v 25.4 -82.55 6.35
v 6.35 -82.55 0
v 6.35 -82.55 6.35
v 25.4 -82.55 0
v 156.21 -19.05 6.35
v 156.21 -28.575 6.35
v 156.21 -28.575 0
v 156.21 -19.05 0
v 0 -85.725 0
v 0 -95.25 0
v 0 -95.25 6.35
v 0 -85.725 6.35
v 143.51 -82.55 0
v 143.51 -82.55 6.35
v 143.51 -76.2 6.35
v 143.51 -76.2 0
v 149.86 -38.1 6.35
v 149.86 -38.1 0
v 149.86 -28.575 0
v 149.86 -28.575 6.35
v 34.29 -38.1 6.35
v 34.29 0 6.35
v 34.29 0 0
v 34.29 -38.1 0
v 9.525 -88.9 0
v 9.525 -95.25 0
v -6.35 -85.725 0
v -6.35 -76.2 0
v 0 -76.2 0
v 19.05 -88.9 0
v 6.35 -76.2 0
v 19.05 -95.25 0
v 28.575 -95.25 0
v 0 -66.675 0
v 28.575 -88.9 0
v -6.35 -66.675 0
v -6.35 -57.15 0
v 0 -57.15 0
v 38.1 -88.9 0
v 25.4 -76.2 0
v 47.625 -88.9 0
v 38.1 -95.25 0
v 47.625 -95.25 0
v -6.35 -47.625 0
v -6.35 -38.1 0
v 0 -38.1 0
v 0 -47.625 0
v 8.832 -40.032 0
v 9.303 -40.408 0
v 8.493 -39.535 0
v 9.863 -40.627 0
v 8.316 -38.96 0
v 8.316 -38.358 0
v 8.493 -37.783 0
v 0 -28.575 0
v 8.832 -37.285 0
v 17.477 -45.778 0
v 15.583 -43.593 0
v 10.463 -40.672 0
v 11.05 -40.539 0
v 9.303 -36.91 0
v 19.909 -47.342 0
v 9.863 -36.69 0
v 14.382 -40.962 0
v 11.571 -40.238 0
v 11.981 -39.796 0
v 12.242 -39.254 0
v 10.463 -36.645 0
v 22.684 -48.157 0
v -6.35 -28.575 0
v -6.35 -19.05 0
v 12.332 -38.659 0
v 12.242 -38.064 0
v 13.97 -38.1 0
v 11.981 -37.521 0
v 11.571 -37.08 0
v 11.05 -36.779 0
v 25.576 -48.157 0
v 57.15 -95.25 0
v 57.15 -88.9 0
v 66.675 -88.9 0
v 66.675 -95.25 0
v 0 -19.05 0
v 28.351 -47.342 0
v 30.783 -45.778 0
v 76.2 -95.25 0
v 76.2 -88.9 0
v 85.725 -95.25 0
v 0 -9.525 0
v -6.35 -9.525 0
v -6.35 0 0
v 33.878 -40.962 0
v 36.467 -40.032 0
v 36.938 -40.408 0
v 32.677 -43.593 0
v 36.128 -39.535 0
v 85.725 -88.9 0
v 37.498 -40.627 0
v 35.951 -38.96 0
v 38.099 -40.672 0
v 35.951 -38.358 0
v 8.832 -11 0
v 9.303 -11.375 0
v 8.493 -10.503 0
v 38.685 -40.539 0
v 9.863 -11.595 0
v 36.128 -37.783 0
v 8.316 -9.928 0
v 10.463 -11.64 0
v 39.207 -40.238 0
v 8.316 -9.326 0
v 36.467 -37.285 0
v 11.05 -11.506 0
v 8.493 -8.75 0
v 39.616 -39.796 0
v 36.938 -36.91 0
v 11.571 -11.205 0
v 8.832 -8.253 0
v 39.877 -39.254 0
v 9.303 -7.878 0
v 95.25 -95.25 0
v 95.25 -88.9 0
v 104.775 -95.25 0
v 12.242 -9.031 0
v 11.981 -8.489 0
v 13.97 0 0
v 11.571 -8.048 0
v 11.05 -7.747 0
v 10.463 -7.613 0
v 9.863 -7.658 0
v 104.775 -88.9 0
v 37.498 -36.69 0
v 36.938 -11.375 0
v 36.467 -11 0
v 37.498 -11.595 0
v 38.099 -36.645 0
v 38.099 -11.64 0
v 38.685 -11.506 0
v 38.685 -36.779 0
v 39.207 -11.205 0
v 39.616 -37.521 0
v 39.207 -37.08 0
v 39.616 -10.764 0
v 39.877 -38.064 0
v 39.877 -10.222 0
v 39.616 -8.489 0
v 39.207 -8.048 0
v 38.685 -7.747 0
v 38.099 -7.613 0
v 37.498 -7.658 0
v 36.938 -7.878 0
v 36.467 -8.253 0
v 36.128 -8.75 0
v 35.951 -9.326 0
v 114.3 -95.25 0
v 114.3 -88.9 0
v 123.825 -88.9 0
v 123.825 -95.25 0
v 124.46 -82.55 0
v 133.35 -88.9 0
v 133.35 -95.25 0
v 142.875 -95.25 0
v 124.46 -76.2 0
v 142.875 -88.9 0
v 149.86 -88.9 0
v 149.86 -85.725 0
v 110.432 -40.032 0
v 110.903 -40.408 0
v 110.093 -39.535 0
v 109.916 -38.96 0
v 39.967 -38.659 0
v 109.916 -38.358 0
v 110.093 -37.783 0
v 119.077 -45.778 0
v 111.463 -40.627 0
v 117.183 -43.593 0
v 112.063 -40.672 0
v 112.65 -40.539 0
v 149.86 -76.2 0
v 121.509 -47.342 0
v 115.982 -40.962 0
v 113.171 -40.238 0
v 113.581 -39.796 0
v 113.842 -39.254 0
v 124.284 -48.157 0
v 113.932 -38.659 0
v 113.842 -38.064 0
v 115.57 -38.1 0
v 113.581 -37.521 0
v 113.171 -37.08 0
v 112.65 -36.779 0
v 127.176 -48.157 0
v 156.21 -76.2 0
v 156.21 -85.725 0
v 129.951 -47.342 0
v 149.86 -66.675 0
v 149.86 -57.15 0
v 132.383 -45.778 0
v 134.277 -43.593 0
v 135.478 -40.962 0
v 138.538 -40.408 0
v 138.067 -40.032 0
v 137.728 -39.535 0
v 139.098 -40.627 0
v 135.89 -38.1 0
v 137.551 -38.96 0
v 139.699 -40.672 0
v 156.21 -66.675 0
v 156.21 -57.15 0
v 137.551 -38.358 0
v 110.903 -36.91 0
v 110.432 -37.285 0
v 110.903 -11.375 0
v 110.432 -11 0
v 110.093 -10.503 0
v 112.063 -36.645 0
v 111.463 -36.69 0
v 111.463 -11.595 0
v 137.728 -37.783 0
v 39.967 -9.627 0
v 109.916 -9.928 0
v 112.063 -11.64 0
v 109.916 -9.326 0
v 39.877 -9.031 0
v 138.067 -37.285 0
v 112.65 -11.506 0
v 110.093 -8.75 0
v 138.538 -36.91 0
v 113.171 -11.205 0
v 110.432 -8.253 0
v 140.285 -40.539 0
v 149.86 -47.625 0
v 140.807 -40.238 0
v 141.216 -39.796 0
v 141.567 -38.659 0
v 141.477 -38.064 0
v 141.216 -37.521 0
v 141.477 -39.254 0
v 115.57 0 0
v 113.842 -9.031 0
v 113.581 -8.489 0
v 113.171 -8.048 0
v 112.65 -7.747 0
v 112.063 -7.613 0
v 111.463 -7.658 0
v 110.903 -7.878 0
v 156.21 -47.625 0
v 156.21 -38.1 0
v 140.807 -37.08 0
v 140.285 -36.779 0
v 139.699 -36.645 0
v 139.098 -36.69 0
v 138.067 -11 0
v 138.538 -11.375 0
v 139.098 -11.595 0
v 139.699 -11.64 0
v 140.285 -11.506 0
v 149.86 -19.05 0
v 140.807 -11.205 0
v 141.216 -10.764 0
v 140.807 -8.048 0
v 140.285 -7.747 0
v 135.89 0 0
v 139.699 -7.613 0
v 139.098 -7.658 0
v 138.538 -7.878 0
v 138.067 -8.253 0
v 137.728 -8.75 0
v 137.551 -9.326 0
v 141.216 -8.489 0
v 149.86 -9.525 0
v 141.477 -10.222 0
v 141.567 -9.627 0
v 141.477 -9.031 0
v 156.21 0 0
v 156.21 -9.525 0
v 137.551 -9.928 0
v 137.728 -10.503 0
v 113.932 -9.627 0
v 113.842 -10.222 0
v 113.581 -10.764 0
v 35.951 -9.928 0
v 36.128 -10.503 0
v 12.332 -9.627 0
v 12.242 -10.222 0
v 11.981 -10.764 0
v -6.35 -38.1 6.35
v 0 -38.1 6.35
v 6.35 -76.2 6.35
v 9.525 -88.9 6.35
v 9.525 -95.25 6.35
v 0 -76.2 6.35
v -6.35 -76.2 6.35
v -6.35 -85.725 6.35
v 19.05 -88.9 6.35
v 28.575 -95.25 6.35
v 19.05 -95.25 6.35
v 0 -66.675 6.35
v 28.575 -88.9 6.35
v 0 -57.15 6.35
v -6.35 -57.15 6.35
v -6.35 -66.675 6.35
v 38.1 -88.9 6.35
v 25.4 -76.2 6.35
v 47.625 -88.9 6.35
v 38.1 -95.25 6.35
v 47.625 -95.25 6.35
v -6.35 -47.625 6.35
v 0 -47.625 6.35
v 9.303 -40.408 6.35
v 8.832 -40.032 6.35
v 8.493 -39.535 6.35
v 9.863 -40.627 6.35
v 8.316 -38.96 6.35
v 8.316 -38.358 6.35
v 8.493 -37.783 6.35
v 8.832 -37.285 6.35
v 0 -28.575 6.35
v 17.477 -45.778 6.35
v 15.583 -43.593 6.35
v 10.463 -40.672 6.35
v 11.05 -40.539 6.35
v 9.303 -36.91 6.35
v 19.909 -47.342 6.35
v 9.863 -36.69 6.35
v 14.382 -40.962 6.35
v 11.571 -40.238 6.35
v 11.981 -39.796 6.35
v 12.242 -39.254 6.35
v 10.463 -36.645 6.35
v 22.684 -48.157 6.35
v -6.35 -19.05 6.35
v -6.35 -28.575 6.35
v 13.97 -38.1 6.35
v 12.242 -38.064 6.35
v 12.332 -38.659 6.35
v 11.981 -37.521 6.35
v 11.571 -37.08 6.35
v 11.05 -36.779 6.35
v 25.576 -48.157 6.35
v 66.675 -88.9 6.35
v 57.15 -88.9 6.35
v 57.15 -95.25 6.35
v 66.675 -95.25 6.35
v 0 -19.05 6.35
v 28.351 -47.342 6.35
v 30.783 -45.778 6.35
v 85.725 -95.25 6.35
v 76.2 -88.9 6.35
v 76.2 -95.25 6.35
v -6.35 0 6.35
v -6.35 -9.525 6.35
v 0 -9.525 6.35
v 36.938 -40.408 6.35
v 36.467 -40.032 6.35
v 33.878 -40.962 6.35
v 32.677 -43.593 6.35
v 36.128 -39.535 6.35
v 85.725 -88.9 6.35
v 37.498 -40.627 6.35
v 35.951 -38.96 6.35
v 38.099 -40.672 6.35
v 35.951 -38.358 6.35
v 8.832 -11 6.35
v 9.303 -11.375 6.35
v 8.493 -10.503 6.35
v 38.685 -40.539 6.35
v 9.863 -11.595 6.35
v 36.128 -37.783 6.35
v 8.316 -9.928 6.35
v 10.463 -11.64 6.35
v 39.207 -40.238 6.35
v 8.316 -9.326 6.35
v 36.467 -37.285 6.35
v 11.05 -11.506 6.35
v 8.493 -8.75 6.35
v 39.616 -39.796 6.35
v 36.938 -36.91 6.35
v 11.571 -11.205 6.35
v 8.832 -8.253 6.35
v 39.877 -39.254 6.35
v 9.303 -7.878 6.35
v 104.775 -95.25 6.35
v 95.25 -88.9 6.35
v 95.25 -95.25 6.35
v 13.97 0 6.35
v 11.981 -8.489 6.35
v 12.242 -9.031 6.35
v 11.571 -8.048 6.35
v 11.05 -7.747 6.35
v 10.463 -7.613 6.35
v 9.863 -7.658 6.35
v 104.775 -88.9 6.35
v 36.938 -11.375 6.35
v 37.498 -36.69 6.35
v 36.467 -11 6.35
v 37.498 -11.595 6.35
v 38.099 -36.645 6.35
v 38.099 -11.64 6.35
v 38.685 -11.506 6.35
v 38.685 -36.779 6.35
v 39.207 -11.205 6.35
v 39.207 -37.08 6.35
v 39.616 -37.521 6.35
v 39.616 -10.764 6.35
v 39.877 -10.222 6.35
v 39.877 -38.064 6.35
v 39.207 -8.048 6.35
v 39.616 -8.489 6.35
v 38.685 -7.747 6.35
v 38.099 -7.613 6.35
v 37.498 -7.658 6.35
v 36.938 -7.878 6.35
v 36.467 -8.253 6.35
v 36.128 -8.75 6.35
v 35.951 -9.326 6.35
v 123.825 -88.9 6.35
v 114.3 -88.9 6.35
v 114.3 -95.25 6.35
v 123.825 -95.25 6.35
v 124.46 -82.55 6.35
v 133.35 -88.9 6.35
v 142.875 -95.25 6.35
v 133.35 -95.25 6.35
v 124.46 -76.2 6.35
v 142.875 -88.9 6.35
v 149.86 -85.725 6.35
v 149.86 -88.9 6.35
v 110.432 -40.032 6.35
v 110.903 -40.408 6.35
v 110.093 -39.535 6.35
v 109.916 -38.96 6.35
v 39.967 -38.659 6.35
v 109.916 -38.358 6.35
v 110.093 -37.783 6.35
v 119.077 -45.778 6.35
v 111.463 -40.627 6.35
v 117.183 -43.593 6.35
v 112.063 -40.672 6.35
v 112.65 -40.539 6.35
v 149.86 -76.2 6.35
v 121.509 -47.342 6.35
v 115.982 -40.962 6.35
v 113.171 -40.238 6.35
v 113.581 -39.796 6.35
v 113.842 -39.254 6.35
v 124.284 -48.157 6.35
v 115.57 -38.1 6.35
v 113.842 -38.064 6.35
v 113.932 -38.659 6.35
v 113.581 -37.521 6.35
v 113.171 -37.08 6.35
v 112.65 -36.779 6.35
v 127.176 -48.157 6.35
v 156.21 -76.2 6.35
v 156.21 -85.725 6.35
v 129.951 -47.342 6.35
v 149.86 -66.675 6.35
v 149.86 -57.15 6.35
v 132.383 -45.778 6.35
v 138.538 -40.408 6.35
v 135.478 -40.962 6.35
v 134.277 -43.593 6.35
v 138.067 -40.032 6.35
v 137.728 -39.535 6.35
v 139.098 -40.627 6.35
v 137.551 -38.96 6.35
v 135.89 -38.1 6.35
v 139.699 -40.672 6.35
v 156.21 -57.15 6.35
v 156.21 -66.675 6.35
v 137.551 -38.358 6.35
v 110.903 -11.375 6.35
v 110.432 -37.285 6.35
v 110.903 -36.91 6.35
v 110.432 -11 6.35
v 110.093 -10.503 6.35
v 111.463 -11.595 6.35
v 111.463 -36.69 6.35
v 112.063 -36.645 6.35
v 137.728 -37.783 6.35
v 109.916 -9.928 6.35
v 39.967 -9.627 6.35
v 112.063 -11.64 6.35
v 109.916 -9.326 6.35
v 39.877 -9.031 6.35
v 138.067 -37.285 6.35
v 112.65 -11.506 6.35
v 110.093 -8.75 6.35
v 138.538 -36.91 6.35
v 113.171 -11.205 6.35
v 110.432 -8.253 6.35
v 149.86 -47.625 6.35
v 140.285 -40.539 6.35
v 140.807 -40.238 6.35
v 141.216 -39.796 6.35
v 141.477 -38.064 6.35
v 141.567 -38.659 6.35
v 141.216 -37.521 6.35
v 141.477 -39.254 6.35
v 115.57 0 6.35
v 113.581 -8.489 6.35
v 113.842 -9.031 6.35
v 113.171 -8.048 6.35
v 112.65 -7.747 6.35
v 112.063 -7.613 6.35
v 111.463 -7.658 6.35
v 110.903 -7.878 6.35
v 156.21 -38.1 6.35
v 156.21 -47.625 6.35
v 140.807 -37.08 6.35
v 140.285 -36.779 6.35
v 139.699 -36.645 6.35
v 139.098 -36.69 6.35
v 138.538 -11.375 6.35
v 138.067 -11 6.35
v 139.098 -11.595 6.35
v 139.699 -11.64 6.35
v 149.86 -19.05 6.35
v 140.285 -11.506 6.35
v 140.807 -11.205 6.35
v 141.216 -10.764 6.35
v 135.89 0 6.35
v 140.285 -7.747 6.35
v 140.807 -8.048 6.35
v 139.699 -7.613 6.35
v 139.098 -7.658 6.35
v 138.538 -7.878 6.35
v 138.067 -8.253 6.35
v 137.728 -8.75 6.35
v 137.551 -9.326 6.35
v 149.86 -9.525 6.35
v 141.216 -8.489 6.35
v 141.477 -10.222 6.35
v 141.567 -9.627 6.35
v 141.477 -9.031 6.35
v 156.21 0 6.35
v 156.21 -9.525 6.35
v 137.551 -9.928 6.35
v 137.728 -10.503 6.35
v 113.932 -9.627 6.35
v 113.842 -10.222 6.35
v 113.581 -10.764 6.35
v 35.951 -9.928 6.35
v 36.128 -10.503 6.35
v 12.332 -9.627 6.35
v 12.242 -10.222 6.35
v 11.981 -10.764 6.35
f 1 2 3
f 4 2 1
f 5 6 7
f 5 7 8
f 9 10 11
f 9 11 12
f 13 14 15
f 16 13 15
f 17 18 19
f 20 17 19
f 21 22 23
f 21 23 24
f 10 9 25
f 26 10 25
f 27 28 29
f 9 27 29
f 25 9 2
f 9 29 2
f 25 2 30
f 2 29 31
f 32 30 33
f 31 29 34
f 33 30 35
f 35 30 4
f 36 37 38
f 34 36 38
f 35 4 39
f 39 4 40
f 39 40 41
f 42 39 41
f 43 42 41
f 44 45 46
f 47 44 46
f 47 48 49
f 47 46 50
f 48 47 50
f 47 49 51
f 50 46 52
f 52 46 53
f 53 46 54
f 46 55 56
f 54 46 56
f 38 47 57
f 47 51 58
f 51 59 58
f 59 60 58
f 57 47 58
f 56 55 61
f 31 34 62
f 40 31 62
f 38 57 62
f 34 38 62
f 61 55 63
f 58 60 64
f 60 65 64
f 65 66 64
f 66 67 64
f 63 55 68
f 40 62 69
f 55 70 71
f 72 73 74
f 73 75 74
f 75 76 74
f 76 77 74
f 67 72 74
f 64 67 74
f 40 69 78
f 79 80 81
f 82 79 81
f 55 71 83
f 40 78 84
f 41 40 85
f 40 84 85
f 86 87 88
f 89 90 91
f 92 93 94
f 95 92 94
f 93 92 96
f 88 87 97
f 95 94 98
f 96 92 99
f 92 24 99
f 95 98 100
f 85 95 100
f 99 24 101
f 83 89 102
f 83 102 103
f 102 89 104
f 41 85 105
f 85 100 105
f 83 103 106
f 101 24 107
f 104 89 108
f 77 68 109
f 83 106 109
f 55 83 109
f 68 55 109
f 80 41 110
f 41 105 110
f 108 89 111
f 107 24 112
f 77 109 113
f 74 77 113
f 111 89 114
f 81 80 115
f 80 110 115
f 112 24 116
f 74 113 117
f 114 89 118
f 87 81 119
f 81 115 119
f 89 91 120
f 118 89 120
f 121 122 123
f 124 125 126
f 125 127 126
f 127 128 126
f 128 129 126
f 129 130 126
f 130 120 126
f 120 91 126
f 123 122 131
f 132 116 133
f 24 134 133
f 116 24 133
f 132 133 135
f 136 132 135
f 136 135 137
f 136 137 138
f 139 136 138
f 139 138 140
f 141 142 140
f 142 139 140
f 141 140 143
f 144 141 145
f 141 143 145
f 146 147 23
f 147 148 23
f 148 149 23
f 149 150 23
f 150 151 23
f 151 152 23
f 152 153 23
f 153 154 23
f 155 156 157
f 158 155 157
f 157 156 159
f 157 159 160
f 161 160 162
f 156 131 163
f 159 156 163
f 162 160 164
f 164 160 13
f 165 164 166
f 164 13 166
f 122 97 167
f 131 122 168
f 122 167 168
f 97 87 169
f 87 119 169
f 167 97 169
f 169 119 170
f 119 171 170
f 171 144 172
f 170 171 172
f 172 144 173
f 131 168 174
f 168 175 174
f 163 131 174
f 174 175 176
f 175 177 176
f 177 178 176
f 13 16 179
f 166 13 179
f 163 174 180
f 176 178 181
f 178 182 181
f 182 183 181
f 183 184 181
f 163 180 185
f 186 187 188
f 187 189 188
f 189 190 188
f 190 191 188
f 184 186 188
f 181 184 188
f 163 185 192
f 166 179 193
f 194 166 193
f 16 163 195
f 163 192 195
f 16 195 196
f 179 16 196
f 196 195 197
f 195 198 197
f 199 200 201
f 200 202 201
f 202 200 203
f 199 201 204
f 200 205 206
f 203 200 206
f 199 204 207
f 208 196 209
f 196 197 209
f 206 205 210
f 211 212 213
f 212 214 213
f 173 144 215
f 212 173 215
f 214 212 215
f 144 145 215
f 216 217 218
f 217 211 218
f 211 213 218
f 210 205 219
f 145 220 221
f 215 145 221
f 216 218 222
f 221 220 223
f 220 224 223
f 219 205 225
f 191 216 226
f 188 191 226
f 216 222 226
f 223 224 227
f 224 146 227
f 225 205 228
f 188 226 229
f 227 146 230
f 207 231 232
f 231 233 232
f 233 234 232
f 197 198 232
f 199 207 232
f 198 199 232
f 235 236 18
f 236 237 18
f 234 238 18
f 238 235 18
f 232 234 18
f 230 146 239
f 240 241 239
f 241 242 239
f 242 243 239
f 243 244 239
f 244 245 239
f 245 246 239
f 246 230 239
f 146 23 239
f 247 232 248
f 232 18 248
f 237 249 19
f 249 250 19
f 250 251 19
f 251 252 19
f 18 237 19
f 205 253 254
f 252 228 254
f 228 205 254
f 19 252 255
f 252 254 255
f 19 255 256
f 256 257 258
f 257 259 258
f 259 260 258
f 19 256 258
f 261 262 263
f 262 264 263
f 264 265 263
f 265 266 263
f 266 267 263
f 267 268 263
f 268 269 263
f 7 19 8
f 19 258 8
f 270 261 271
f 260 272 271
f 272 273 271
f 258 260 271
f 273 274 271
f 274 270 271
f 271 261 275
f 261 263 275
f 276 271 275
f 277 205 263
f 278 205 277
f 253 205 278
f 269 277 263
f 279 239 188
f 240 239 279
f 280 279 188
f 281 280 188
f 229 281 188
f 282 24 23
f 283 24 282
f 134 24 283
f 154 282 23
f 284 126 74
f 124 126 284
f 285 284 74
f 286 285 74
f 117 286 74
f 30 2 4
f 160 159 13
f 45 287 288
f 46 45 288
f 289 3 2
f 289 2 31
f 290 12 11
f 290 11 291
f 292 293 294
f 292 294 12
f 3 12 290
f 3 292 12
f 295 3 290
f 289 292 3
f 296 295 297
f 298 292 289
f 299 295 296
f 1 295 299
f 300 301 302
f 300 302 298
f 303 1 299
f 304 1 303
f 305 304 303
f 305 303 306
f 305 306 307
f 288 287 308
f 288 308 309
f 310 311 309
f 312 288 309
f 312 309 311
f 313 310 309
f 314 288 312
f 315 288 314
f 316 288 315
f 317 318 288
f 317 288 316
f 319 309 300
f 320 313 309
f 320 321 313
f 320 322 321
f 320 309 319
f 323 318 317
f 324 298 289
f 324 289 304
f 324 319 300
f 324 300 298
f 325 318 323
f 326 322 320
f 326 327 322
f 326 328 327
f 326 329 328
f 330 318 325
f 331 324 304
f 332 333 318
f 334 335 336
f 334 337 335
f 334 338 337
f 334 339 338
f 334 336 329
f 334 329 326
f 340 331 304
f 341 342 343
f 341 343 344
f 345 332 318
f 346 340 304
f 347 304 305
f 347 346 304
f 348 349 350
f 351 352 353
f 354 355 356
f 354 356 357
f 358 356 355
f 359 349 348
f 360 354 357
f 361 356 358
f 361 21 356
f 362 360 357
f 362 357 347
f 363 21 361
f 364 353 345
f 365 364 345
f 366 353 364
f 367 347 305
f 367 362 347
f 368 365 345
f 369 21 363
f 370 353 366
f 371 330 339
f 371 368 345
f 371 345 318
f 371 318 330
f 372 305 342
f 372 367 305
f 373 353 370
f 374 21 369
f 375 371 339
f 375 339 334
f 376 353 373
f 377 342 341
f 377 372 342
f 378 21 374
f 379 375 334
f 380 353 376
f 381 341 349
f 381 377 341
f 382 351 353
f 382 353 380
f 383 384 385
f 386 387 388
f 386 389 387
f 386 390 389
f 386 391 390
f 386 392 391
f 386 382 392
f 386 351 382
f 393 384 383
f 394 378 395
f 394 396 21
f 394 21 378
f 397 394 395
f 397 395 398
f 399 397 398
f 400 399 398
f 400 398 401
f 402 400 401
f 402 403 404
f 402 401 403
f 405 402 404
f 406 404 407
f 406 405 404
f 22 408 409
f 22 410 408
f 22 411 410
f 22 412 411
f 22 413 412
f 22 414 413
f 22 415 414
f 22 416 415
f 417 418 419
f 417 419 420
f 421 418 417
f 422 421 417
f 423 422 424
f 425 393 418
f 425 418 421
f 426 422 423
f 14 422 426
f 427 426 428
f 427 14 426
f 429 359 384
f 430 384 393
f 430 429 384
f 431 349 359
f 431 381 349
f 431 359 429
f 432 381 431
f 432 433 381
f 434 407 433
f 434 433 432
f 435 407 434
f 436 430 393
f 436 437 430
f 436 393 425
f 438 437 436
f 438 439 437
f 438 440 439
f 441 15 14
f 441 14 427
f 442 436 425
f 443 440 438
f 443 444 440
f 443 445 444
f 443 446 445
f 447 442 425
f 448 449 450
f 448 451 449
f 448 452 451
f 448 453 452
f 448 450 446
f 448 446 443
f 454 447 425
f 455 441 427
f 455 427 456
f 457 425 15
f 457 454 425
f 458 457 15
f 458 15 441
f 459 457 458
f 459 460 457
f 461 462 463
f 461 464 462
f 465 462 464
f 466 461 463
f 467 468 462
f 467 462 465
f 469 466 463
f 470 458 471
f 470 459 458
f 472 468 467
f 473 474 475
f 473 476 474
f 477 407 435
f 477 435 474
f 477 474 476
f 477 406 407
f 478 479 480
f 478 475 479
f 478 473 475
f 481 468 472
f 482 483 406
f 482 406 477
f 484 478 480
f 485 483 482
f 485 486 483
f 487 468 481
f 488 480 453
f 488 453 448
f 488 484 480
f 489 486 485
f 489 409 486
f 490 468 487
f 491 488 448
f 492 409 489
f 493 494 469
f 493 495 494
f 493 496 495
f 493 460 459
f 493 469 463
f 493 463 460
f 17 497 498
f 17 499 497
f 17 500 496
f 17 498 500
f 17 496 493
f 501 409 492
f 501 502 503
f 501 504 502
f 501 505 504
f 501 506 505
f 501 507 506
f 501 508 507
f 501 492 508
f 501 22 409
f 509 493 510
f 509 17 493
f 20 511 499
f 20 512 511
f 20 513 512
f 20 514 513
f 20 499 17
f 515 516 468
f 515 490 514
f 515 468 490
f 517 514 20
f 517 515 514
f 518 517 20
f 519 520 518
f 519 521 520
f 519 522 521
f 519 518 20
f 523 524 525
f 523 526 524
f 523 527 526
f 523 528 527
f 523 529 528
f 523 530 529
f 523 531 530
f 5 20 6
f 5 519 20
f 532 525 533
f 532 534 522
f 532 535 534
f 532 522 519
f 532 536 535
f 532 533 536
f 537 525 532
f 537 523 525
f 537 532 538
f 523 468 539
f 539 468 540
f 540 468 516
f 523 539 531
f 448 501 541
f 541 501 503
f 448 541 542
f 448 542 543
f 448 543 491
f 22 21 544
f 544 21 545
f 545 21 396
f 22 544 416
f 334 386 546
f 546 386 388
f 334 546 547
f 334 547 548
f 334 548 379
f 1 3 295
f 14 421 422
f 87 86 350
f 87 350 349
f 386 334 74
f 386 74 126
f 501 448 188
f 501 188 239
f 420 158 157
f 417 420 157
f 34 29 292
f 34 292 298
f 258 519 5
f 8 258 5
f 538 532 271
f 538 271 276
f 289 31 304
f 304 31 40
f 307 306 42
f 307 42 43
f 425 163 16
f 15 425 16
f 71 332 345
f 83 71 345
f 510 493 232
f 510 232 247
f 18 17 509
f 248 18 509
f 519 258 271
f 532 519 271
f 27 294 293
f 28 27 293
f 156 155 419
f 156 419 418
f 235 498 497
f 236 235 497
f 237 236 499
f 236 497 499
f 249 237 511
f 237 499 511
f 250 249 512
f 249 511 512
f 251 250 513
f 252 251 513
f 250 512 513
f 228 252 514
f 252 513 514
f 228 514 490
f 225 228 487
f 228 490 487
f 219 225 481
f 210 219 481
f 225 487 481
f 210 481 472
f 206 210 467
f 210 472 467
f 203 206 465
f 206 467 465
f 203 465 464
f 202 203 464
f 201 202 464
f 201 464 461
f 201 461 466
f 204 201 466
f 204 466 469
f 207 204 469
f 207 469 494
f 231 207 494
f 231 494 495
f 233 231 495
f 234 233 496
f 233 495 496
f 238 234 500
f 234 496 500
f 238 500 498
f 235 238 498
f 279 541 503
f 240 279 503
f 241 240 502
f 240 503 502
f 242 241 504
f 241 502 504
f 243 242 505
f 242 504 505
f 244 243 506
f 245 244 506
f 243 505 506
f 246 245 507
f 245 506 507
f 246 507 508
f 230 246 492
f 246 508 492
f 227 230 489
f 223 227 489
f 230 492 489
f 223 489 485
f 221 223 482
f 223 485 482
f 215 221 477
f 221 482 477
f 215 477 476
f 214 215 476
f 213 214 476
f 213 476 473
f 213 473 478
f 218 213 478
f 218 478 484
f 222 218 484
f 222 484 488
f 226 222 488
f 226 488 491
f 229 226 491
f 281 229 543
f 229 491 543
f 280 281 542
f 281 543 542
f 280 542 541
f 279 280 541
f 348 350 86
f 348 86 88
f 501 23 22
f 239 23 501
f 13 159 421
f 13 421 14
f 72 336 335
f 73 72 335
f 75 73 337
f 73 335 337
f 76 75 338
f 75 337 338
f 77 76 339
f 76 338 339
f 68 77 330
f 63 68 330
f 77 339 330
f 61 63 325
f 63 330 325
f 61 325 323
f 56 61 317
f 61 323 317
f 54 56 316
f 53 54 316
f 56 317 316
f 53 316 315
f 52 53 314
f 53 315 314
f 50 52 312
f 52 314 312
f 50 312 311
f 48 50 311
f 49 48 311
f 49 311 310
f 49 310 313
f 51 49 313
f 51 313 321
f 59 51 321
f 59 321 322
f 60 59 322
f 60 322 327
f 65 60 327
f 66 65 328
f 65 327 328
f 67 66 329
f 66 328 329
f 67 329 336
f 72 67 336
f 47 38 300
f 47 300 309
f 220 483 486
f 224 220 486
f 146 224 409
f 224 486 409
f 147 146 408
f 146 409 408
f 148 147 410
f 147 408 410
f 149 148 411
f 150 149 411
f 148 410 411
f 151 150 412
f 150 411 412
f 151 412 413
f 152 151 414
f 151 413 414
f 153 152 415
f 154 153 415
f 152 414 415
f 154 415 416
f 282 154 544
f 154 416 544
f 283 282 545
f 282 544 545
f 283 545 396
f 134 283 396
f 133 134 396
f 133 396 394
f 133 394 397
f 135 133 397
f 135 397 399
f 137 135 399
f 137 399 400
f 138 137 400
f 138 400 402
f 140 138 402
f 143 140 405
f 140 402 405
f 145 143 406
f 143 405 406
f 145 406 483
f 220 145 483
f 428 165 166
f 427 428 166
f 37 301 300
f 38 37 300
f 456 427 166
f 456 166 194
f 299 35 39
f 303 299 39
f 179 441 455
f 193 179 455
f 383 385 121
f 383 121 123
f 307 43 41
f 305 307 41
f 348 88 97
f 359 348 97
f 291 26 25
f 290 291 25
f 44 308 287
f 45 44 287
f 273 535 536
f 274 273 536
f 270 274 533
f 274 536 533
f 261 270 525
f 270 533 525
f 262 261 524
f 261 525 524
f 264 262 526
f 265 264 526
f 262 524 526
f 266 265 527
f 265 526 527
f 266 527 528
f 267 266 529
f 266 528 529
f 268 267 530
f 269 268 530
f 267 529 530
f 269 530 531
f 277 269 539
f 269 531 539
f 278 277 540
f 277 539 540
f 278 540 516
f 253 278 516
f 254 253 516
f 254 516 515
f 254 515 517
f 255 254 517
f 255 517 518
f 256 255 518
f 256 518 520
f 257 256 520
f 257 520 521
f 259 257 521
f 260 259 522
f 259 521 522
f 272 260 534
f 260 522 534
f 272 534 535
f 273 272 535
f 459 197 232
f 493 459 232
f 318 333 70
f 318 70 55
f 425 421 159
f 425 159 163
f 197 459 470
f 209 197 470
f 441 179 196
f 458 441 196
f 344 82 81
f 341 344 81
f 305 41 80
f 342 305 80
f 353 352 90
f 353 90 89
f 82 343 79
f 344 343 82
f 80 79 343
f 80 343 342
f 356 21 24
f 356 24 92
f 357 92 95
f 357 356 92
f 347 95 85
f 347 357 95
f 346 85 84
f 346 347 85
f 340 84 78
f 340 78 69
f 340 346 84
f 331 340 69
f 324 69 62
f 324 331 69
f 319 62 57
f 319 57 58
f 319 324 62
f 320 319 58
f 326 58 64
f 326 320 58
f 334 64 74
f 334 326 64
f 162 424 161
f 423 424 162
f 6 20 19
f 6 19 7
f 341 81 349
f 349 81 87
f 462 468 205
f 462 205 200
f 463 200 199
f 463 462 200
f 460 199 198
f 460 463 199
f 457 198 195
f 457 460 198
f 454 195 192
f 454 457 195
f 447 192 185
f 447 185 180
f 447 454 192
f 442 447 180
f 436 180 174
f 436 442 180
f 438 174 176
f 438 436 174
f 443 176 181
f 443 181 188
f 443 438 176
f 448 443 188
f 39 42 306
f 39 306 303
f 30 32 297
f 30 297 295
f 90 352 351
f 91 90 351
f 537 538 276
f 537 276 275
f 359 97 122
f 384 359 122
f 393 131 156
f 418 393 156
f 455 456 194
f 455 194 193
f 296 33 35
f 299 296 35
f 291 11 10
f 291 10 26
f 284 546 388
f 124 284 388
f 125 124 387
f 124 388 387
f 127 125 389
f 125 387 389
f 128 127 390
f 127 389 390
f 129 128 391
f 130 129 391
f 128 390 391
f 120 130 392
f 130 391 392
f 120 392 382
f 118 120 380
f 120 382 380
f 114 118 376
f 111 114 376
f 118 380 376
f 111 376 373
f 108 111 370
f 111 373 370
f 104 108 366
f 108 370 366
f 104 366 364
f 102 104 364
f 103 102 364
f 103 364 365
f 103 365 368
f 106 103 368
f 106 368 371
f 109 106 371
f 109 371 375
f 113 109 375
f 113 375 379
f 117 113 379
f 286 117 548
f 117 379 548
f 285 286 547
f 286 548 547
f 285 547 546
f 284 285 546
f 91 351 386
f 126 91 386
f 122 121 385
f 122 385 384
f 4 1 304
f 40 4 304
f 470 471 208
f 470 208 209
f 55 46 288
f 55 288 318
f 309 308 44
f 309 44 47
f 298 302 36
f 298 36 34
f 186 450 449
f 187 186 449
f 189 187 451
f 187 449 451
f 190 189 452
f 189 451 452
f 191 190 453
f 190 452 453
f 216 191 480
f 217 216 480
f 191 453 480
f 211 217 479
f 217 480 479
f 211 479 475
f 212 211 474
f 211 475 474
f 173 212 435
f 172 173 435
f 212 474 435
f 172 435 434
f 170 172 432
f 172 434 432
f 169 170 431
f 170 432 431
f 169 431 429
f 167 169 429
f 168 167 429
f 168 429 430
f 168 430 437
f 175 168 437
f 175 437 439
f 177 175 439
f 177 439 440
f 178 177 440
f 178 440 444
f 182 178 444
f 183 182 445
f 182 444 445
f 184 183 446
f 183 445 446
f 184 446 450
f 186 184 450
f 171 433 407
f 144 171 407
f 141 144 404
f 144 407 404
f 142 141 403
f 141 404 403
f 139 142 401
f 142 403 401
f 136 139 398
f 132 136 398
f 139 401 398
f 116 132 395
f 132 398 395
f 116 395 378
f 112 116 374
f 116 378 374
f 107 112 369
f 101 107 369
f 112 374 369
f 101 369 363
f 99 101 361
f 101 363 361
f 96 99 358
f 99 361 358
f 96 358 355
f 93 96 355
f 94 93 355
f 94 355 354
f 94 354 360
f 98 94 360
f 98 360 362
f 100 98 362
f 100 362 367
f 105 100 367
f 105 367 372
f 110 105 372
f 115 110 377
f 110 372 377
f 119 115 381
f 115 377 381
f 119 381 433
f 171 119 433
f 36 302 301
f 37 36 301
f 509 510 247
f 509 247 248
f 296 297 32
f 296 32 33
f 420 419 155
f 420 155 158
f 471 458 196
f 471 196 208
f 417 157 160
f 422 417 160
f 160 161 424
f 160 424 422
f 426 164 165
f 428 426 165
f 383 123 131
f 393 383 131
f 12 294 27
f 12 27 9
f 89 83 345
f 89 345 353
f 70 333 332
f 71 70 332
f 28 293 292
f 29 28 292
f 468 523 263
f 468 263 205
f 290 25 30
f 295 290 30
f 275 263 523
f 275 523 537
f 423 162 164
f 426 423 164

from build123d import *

# Parameters (mm, degrees)
SKETCH1_W           = 149.86
SKETCH1_H           = 88.9
SKETCH1_W_2         = 19.05
SKETCH1_H_2         = 6.35
GENERAL_SHAPE_DEPTH = 6.35
SKETCH4_R           = 2.0193
SLOT_CUT_OUTS_DEPTH = 6.35
SKETCH5_W           = 6.35
SKETCH5_H           = 9.525
SKETCH5_W_2         = 9.525
SKETCH5_H_2         = 6.35
EDGE_TEETH_DEPTH    = 6.35


with BuildPart() as part:
    # Sketch1 → General Shape (new body)
    with BuildSketch(Plane.XY):
        with Locations((74.93, -44.45)):
            Rectangle(SKETCH1_W, SKETCH1_H)
        with Locations((133.985, -79.375)):
            Rectangle(SKETCH1_W_2, SKETCH1_H_2, mode=Mode.SUBTRACT)
        with Locations((15.875, -79.375)):
            Rectangle(SKETCH1_W_2, SKETCH1_H_2, mode=Mode.SUBTRACT)
    extrude(amount=GENERAL_SHAPE_DEPTH)

    # Sketch4 → Slot Cut-Outs (cut)
    with BuildSketch(Plane.XY.offset(6.35)):
        with Locations((37.9476, -9.6266)):
            Circle(SKETCH4_R)
        with Locations((37.9476, -38.6588)):
            Circle(SKETCH4_R)
        with Locations((10.3124, -38.6588)):
            Circle(SKETCH4_R)
        with Locations((10.3124, -9.6266)):
            Circle(SKETCH4_R)
        with Locations((139.5476, -9.6266)):
            Circle(SKETCH4_R)
        with Locations((111.9124, -9.6266)):
            Circle(SKETCH4_R)
        with Locations((111.9124, -38.6588)):
            Circle(SKETCH4_R)
        with Locations((139.5476, -38.6588)):
            Circle(SKETCH4_R)
        with BuildLine():
            Line((34.29, 0), (34.29, -38.1))
            ThreePointArc((34.29, -38.1), (24.13, -48.26), (13.97, -38.1))
            Line((13.97, -38.1), (13.97, 0))
            ThreePointArc((13.97, 0), (24.13, 10.16), (34.29, 0))
        make_face()
        with BuildLine():
            Line((135.89, 0), (135.89, -38.1))
            ThreePointArc((135.89, -38.1), (125.73, -48.26), (115.57, -38.1))
            Line((115.57, -38.1), (115.57, 0))
            ThreePointArc((115.57, 0), (125.73, 10.16), (135.89, 0))
        make_face()
    extrude(amount=-SLOT_CUT_OUTS_DEPTH, mode=Mode.SUBTRACT)

    # Sketch5 → Edge Teeth (add)
    with BuildSketch(Plane.XY.offset(6.35)):
        with Locations((-3.175, -4.7625)):
            Rectangle(SKETCH5_W, SKETCH5_H)
        with Locations((-3.175, -23.8125)):
            Rectangle(SKETCH5_W, SKETCH5_H)
        with Locations((-3.175, -42.8625)):
            Rectangle(SKETCH5_W, SKETCH5_H)
        with Locations((-3.175, -61.9125)):
            Rectangle(SKETCH5_W, SKETCH5_H)
        with Locations((-3.175, -80.9625)):
            Rectangle(SKETCH5_W, SKETCH5_H)
        with Locations((153.035, -80.9625)):
            Rectangle(SKETCH5_W, SKETCH5_H)
        with Locations((153.035, -61.9125)):
            Rectangle(SKETCH5_W, SKETCH5_H)
        with Locations((153.035, -42.8625)):
            Rectangle(SKETCH5_W, SKETCH5_H)
        with Locations((153.035, -23.8125)):
            Rectangle(SKETCH5_W, SKETCH5_H)
        with Locations((153.035, -4.7625)):
            Rectangle(SKETCH5_W, SKETCH5_H)
        with Locations((23.8125, -92.075)):
            Rectangle(SKETCH5_W_2, SKETCH5_H_2)
        with Locations((4.7625, -92.075)):
            Rectangle(SKETCH5_W_2, SKETCH5_H_2)
        with Locations((42.8625, -92.075)):
            Rectangle(SKETCH5_W_2, SKETCH5_H_2)
        with Locations((61.9125, -92.075)):
            Rectangle(SKETCH5_W_2, SKETCH5_H_2)
        with Locations((80.9625, -92.075)):
            Rectangle(SKETCH5_W_2, SKETCH5_H_2)
        with Locations((100.0125, -92.075)):
            Rectangle(SKETCH5_W_2, SKETCH5_H_2)
        with Locations((119.0625, -92.075)):
            Rectangle(SKETCH5_W_2, SKETCH5_H_2)
        with Locations((138.1125, -92.075)):
            Rectangle(SKETCH5_W_2, SKETCH5_H_2)
    extrude(amount=-EDGE_TEETH_DEPTH)


solid = part.part
